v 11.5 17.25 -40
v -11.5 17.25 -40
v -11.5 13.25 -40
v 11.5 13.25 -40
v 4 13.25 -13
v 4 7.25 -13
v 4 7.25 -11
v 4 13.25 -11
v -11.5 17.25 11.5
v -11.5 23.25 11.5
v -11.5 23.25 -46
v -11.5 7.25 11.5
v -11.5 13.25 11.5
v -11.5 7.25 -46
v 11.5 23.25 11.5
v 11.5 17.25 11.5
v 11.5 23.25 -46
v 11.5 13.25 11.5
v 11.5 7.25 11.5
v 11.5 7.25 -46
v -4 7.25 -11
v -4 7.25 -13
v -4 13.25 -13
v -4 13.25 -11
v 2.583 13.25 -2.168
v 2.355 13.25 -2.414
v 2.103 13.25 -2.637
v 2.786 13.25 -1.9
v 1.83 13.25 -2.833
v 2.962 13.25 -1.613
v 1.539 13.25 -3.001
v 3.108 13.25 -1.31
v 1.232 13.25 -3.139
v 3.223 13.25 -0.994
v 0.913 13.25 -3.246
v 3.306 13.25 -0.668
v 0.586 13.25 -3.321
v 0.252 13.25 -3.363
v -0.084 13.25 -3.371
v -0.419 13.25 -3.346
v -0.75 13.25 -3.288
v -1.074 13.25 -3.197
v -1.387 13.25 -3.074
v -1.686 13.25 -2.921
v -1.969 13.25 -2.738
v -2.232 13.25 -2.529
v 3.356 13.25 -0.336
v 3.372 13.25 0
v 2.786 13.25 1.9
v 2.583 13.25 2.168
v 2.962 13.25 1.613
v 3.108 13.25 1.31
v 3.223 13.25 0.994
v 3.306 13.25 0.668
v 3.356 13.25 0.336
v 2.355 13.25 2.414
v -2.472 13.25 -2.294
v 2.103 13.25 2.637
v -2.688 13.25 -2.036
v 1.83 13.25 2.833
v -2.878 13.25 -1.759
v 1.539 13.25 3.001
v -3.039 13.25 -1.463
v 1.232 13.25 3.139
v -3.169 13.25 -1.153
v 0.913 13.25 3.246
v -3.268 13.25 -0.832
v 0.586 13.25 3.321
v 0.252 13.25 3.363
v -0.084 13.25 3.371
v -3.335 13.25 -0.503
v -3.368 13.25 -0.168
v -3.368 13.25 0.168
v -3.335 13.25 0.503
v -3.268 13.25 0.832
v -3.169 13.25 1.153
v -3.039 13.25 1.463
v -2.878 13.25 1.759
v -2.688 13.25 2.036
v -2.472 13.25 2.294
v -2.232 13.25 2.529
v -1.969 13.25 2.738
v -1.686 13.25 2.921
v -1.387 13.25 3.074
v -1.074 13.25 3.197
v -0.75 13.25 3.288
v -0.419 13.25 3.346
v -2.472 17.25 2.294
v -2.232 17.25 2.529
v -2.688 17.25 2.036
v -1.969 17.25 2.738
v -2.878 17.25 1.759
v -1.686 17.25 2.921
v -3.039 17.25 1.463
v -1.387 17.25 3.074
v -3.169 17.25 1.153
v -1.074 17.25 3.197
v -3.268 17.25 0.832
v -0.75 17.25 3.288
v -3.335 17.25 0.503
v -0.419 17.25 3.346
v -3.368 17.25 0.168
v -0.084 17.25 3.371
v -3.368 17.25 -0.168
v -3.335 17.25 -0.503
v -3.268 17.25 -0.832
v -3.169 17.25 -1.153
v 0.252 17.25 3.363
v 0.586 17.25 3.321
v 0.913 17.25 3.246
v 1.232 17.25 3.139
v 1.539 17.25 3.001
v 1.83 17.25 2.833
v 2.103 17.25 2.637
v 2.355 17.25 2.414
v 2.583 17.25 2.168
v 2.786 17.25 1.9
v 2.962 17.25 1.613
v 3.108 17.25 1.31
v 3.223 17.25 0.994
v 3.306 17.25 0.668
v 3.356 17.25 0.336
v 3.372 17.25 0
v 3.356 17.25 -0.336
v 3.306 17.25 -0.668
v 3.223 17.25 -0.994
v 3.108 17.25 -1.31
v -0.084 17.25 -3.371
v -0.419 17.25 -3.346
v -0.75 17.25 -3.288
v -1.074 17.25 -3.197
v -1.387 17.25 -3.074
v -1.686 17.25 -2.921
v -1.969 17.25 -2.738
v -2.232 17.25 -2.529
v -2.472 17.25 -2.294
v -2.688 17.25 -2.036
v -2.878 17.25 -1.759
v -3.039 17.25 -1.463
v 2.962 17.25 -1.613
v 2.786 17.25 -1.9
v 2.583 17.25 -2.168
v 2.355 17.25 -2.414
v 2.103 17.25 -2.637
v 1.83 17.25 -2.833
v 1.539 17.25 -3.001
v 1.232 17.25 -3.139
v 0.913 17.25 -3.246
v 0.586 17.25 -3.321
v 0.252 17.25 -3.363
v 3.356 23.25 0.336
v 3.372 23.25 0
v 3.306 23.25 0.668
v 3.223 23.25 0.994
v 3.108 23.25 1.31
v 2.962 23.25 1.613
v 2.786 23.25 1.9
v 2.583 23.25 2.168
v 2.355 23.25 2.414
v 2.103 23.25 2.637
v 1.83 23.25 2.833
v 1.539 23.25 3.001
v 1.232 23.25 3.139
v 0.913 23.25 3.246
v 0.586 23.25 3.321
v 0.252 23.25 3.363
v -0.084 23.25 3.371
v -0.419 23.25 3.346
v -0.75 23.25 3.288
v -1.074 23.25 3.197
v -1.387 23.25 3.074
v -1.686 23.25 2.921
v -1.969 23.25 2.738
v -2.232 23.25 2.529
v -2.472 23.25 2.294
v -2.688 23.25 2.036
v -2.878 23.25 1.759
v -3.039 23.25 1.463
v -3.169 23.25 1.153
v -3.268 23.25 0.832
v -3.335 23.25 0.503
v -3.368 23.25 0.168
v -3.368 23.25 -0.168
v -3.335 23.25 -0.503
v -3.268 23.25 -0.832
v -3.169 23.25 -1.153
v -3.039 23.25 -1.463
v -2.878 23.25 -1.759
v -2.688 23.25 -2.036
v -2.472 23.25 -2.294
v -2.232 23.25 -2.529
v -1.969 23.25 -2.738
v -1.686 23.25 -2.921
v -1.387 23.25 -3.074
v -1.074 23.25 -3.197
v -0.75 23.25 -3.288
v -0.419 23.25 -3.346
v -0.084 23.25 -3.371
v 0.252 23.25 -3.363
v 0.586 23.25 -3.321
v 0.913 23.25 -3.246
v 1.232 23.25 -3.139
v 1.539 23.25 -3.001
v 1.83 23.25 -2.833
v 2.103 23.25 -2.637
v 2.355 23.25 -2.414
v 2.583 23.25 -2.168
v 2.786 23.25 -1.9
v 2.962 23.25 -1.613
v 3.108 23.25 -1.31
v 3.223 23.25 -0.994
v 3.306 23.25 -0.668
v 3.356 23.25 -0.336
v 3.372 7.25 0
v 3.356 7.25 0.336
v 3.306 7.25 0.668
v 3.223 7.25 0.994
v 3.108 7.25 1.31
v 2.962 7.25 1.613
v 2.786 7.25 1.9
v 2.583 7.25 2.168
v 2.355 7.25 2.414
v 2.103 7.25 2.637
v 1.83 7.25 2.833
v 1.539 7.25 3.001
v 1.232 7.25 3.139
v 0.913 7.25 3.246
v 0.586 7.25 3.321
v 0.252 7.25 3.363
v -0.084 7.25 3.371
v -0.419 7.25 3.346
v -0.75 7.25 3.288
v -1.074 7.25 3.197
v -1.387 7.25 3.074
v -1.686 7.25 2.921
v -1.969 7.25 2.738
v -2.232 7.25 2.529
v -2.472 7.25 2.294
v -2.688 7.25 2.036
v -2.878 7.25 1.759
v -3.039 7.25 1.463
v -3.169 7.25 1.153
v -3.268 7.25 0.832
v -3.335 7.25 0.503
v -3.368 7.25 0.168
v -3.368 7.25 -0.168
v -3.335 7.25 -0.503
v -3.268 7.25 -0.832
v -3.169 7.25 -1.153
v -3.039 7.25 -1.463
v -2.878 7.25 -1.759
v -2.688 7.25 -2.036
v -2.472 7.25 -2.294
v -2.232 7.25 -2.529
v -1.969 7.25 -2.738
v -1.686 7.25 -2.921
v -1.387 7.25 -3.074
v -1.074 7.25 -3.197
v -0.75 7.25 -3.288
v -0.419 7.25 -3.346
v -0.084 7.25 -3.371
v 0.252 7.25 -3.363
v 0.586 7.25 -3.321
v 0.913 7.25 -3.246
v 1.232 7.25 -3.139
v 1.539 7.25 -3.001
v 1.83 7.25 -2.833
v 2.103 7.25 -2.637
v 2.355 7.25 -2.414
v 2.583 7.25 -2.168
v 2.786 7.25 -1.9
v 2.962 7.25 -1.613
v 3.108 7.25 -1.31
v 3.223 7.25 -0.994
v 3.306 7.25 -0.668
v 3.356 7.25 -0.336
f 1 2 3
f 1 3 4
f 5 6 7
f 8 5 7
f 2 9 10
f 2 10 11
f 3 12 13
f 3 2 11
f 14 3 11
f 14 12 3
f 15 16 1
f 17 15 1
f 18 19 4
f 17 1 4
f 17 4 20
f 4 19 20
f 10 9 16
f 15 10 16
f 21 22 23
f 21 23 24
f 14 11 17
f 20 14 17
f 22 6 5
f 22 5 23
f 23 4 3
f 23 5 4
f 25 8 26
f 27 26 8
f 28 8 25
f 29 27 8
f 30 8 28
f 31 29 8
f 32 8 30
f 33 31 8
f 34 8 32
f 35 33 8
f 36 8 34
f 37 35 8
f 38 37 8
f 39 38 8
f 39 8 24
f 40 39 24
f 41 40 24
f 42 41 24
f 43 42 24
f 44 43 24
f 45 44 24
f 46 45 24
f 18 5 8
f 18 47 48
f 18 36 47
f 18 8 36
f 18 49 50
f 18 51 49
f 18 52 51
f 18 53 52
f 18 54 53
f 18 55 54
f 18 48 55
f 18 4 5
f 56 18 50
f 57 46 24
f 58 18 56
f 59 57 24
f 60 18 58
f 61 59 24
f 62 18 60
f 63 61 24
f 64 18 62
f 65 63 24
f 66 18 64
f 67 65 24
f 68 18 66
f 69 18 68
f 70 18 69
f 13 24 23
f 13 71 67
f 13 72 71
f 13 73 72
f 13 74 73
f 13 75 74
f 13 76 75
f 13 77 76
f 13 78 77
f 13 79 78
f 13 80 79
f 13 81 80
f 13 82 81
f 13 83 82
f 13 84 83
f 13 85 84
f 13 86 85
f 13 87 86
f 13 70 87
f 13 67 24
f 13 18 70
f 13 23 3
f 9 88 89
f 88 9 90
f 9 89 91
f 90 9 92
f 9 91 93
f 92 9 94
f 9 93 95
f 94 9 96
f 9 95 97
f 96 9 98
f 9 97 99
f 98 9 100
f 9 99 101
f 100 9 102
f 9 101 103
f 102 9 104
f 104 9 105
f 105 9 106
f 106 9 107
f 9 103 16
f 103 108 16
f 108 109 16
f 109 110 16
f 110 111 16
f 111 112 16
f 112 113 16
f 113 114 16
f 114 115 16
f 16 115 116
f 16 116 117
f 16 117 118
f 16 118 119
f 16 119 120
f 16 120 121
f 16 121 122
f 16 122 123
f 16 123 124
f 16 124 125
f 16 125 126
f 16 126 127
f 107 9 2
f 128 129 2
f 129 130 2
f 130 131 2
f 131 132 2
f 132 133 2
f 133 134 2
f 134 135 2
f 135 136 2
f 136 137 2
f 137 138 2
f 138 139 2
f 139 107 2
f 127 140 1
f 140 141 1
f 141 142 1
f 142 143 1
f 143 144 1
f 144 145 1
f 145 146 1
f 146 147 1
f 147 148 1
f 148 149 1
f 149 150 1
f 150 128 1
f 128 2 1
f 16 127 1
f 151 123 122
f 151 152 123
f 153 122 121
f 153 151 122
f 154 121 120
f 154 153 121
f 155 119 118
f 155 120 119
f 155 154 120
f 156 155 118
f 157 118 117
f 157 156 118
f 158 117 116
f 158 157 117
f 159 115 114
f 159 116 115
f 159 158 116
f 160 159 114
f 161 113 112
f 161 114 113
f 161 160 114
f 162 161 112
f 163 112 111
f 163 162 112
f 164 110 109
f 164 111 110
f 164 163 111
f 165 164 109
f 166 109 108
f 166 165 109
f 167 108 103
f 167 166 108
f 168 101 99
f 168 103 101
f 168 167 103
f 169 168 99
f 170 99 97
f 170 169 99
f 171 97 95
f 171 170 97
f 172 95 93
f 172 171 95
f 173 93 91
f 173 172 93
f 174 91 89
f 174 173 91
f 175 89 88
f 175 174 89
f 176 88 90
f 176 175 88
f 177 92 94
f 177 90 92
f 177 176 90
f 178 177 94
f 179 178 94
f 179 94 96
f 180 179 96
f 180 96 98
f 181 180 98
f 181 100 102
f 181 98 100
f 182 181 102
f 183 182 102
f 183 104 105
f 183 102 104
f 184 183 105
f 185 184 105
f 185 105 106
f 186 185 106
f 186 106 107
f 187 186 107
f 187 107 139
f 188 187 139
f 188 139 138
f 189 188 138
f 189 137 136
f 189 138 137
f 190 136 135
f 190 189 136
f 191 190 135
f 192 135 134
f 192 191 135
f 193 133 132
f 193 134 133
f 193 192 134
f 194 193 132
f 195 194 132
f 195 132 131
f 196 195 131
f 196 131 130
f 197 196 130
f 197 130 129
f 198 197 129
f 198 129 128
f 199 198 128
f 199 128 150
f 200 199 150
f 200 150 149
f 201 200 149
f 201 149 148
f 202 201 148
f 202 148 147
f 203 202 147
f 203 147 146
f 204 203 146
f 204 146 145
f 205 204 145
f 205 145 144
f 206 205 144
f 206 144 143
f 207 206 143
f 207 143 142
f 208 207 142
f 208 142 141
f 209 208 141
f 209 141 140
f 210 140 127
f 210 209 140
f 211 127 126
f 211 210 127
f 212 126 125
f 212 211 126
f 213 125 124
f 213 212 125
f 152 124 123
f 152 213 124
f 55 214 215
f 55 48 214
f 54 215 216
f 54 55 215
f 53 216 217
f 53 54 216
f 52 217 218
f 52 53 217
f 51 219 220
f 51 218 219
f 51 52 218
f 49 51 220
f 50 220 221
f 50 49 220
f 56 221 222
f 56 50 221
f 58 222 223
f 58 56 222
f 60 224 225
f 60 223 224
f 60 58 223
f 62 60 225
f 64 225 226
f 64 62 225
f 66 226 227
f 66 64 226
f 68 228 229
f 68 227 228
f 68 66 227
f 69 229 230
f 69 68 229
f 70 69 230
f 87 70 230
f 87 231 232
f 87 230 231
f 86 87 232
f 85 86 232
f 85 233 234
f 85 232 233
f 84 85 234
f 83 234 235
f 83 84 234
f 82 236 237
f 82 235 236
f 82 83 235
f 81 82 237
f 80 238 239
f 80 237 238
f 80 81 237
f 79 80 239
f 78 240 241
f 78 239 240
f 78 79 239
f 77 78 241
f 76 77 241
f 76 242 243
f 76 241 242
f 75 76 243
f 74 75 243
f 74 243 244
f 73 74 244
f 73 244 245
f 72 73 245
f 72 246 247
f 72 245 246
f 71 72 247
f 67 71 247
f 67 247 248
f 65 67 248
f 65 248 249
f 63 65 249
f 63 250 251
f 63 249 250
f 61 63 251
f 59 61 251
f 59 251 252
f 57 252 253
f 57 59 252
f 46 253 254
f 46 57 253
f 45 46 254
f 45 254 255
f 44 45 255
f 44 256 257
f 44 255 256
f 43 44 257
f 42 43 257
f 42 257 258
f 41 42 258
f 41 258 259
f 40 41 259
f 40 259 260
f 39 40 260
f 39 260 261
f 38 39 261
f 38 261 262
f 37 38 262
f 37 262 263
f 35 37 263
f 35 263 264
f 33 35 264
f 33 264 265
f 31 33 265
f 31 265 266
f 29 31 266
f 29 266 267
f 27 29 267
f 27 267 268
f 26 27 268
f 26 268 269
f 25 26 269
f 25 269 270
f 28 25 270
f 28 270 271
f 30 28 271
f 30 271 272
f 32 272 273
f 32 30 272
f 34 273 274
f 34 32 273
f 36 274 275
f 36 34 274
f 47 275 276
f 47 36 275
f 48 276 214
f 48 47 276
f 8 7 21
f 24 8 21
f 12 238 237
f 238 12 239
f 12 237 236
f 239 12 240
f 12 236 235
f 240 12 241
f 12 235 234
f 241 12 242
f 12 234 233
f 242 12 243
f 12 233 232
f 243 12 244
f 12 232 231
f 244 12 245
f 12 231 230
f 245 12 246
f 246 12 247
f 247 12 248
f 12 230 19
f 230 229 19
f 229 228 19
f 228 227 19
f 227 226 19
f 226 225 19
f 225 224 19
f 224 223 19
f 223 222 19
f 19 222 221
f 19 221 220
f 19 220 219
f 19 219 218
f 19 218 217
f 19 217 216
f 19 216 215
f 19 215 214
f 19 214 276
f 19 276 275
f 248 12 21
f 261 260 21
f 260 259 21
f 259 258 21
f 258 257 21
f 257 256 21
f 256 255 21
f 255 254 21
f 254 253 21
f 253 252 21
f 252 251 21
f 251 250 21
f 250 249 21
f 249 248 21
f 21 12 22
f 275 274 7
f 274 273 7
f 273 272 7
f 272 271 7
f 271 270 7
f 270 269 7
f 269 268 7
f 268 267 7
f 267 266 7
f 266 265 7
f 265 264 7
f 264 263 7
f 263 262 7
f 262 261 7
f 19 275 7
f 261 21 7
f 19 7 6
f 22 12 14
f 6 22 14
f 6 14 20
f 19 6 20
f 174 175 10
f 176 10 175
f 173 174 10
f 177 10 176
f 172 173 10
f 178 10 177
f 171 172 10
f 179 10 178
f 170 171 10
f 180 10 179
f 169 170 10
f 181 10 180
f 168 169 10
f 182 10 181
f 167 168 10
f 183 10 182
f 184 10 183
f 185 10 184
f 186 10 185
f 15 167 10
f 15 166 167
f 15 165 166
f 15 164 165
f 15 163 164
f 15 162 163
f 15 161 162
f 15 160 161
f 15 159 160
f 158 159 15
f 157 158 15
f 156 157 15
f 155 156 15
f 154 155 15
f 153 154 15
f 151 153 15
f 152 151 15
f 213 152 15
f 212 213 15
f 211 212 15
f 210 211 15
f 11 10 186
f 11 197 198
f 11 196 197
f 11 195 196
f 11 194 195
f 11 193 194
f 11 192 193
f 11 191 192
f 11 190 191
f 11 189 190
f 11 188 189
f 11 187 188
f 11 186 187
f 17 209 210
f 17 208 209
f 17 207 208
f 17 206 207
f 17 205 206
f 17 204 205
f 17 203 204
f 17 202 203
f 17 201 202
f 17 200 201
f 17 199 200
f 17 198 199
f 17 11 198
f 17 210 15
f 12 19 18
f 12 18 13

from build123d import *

# Parameters (mm, degrees)
CYLINDER001_R     = 3.3725
CYLINDER001_DEPTH = 30
BOX008_W          = 23
BOX008_H          = 16
BOX008_DEPTH      = 6
BOX009_W          = 23
BOX009_H          = 57.5
BOX009_DEPTH      = 6
SKETCH_W          = 23
SKETCH_H          = 51.5
SKETCH_W_2        = 8
SKETCH_H_2        = 2
EXTRUDE_DEPTH     = 6


with BuildPart() as cylinder001:
    # Cylinder001 → Cylinder001 (new body)
    with BuildSketch(Plane.XZ.offset(-30)):
        Circle(CYLINDER001_R)
    extrude(amount=CYLINDER001_DEPTH)


with BuildPart() as cube008:
    # Box008 → Box008 (new body)
    with BuildSketch(Plane(origin=(-11.5, 7.25, -46), x_dir=(1, 0, 0), z_dir=(0, 0, 1))):
        with Locations((11.5, 8)):
            Rectangle(BOX008_W, BOX008_H)
    extrude(amount=BOX008_DEPTH)


with BuildPart() as cube009:
    # Box009 → Box009 (new body)
    with BuildSketch(Plane(origin=(-11.5, 17.25, 11.5), x_dir=(1, 0, 0), z_dir=(0, 1, 0))):
        with Locations((11.5, 28.75)):
            Rectangle(BOX009_W, BOX009_H)
    extrude(amount=BOX009_DEPTH)


with BuildPart() as mountplate:
    # Sketch → Extrude (new body)
    with BuildSketch(Plane(origin=(0, 0, 0), x_dir=(-1, 0, 0), z_dir=(0, 1, 0))):
        with Locations((0, -14.25)):
            Rectangle(SKETCH_W, SKETCH_H)
        with Locations((0, -12)):
            Rectangle(SKETCH_W_2, SKETCH_H_2, mode=Mode.SUBTRACT)
    extrude(amount=EXTRUDE_DEPTH)


with BuildPart() as mountplate_1:
    # Extrude placement: moved
    add(mountplate.part.moved(Location((0, 7.25, 0))))

    # Fusion003: union Cube008, Cube009
    add(cube008.part)
    add(cube009.part)

    # Cut002: cut Cylinder001
    add(cylinder001.part, mode=Mode.SUBTRACT)


solid = mountplate_1.part
